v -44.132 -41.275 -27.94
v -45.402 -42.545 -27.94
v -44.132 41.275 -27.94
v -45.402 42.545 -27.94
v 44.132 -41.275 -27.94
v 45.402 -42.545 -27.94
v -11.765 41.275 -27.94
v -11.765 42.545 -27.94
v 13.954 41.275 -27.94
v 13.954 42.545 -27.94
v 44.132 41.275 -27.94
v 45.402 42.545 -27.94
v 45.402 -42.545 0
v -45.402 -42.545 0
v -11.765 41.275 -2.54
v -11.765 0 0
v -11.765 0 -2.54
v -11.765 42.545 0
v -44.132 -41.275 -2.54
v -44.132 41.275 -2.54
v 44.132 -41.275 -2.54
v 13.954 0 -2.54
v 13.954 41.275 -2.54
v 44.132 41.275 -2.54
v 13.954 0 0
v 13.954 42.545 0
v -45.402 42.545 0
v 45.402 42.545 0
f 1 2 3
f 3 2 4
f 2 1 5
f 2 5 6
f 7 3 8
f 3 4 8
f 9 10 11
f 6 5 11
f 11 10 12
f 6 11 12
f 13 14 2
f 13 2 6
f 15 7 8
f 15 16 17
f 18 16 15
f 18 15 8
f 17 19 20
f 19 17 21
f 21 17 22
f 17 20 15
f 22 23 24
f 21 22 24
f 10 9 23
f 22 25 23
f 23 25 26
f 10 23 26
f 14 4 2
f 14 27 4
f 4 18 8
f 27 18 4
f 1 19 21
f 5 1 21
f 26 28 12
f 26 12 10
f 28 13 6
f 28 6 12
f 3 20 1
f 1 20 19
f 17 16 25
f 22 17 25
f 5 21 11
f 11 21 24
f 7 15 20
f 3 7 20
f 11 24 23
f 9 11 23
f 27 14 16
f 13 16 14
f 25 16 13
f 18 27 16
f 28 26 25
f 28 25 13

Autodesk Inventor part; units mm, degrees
ref_plane "YZ Plane" through (0, 0, 0) normal (1, 0, 0) x (0, 1, 0)
ref_plane "XZ Plane" through (0, 0, 0) normal (0, 1, 0) x (-1, 0, 0)
ref_plane "XY Plane" through (0, 0, 0) normal (0, 0, 1) x (1, 0, 0)
ref_plane "Work Plane1" through (0, 0, 0) normal (0, 0, 1) x (1, 0, 0)
sketch "Sketch1" plane through (0, 0, 0) normal (0, 0, 1) x (1, 0, 0)
  line L0 (-44.1325, -41.275) -> (44.1325, -41.275)
  line L1 (44.1325, -41.275) -> (44.1325, 41.275)
  line L2 (44.1325, 41.275) -> (-44.1325, 41.275)
  line L3 (-44.1325, 41.275) -> (-44.1325, -41.275)
  line L4 (-44.1325, -41.275) -> (44.1325, 41.275) construction
  line L5 (44.1325, -41.275) -> (-44.1325, 41.275) construction
  line L6 (-45.4025, -42.545) -> (45.4025, -42.545)
  line L7 (45.4025, -42.545) -> (45.4025, 42.545)
  line L8 (45.4025, 42.545) -> (-45.4025, 42.545)
  line L9 (-45.4025, 42.545) -> (-45.4025, -42.545)
  line L10 (-45.4025, -42.545) -> (45.4025, 42.545) construction
  line L11 (45.4025, -42.545) -> (-45.4025, 42.545) construction
  point P0 (0, 0)
  dimension "d1" = 88.265
  dimension "d2" = 82.55
  dimension "d3" = 90.805
  dimension "d4" = 85.09
extrude "Extrusion1" add sketch "Sketch1" against normal blind 27.94
sketch "Sketch2" plane through (0, 0, 0) normal (0, 0, 1) x (1, 0, 0)
  line L0 (44.1325, 41.275) -> (-44.1325, 41.275) projected
  line L1 (-44.1325, -41.275) -> (44.1325, -41.275) projected
  line L2 (-44.1325, 41.275) -> (44.1325, 41.275)
  line L3 (44.1325, 41.275) -> (44.1325, -41.275)
  line L4 (44.1325, -41.275) -> (-44.1325, -41.275)
  line L5 (-44.1325, -41.275) -> (-44.1325, 41.275)
  point P0 (0, 0)
extrude "Extrusion2" add sketch "Sketch2" against normal blind 2.54
sketch "Sketch5" plane through (0, 0, 0) normal (0, 0, 1) x (1, 0, 0)
  line L0 (-45.4025, 42.545) -> (45.4025, 42.545) projected
  line L1 (-5.1231, 42.545) -> (4.8162, 42.545)
  line L2 (4.8162, 42.545) -> (4.8162, 17.0095)
  line L3 (4.8162, 17.0095) -> (-5.1231, 17.0095)
  line L4 (-5.1231, 17.0095) -> (-5.1231, 42.545)
  point P0 (0, 0)
extrude "Extrusion3" cut sketch "Sketch5" against normal up to next
sketch "Sketch6" plane through (0, 0, 0) normal (0, 0, 1) x (1, 0, 0)
  line L0 (-45.4025, 42.545) -> (-5.1231, 42.545) projected
  line L1 (-11.7648, 42.545) -> (10.5336, 42.545)
  line L2 (10.5336, 42.545) -> (10.5336, 5.472)
  line L3 (10.5336, 5.472) -> (-11.7648, 5.472)
  line L4 (-11.7648, 5.472) -> (-11.7648, 42.545)
  point P0 (0, 0)
extrude "Extrusion4" cut sketch "Sketch6" against normal up to next
sketch "Sketch7" plane through (0, 0, 0) normal (0, 0, 1) x (1, 0, 0)
  line L0 (13.9536, 42.6816) -> (-11.7648, 42.6816)
  line L1 (-11.7648, 42.6816) -> (-11.7648, 0)
  line L2 (-11.7648, 0) -> (13.9536, 0)
  line L3 (13.9536, 0) -> (13.9536, 42.6816)
  point P0 (0, 0)
extrude "Extrusion5" cut sketch "Sketch7" against normal up to next
sketch "Sketch8" plane through (0, 0, 0) normal (0, 0, 1) x (1, 0, 0)
  point P0 (0, 0)
